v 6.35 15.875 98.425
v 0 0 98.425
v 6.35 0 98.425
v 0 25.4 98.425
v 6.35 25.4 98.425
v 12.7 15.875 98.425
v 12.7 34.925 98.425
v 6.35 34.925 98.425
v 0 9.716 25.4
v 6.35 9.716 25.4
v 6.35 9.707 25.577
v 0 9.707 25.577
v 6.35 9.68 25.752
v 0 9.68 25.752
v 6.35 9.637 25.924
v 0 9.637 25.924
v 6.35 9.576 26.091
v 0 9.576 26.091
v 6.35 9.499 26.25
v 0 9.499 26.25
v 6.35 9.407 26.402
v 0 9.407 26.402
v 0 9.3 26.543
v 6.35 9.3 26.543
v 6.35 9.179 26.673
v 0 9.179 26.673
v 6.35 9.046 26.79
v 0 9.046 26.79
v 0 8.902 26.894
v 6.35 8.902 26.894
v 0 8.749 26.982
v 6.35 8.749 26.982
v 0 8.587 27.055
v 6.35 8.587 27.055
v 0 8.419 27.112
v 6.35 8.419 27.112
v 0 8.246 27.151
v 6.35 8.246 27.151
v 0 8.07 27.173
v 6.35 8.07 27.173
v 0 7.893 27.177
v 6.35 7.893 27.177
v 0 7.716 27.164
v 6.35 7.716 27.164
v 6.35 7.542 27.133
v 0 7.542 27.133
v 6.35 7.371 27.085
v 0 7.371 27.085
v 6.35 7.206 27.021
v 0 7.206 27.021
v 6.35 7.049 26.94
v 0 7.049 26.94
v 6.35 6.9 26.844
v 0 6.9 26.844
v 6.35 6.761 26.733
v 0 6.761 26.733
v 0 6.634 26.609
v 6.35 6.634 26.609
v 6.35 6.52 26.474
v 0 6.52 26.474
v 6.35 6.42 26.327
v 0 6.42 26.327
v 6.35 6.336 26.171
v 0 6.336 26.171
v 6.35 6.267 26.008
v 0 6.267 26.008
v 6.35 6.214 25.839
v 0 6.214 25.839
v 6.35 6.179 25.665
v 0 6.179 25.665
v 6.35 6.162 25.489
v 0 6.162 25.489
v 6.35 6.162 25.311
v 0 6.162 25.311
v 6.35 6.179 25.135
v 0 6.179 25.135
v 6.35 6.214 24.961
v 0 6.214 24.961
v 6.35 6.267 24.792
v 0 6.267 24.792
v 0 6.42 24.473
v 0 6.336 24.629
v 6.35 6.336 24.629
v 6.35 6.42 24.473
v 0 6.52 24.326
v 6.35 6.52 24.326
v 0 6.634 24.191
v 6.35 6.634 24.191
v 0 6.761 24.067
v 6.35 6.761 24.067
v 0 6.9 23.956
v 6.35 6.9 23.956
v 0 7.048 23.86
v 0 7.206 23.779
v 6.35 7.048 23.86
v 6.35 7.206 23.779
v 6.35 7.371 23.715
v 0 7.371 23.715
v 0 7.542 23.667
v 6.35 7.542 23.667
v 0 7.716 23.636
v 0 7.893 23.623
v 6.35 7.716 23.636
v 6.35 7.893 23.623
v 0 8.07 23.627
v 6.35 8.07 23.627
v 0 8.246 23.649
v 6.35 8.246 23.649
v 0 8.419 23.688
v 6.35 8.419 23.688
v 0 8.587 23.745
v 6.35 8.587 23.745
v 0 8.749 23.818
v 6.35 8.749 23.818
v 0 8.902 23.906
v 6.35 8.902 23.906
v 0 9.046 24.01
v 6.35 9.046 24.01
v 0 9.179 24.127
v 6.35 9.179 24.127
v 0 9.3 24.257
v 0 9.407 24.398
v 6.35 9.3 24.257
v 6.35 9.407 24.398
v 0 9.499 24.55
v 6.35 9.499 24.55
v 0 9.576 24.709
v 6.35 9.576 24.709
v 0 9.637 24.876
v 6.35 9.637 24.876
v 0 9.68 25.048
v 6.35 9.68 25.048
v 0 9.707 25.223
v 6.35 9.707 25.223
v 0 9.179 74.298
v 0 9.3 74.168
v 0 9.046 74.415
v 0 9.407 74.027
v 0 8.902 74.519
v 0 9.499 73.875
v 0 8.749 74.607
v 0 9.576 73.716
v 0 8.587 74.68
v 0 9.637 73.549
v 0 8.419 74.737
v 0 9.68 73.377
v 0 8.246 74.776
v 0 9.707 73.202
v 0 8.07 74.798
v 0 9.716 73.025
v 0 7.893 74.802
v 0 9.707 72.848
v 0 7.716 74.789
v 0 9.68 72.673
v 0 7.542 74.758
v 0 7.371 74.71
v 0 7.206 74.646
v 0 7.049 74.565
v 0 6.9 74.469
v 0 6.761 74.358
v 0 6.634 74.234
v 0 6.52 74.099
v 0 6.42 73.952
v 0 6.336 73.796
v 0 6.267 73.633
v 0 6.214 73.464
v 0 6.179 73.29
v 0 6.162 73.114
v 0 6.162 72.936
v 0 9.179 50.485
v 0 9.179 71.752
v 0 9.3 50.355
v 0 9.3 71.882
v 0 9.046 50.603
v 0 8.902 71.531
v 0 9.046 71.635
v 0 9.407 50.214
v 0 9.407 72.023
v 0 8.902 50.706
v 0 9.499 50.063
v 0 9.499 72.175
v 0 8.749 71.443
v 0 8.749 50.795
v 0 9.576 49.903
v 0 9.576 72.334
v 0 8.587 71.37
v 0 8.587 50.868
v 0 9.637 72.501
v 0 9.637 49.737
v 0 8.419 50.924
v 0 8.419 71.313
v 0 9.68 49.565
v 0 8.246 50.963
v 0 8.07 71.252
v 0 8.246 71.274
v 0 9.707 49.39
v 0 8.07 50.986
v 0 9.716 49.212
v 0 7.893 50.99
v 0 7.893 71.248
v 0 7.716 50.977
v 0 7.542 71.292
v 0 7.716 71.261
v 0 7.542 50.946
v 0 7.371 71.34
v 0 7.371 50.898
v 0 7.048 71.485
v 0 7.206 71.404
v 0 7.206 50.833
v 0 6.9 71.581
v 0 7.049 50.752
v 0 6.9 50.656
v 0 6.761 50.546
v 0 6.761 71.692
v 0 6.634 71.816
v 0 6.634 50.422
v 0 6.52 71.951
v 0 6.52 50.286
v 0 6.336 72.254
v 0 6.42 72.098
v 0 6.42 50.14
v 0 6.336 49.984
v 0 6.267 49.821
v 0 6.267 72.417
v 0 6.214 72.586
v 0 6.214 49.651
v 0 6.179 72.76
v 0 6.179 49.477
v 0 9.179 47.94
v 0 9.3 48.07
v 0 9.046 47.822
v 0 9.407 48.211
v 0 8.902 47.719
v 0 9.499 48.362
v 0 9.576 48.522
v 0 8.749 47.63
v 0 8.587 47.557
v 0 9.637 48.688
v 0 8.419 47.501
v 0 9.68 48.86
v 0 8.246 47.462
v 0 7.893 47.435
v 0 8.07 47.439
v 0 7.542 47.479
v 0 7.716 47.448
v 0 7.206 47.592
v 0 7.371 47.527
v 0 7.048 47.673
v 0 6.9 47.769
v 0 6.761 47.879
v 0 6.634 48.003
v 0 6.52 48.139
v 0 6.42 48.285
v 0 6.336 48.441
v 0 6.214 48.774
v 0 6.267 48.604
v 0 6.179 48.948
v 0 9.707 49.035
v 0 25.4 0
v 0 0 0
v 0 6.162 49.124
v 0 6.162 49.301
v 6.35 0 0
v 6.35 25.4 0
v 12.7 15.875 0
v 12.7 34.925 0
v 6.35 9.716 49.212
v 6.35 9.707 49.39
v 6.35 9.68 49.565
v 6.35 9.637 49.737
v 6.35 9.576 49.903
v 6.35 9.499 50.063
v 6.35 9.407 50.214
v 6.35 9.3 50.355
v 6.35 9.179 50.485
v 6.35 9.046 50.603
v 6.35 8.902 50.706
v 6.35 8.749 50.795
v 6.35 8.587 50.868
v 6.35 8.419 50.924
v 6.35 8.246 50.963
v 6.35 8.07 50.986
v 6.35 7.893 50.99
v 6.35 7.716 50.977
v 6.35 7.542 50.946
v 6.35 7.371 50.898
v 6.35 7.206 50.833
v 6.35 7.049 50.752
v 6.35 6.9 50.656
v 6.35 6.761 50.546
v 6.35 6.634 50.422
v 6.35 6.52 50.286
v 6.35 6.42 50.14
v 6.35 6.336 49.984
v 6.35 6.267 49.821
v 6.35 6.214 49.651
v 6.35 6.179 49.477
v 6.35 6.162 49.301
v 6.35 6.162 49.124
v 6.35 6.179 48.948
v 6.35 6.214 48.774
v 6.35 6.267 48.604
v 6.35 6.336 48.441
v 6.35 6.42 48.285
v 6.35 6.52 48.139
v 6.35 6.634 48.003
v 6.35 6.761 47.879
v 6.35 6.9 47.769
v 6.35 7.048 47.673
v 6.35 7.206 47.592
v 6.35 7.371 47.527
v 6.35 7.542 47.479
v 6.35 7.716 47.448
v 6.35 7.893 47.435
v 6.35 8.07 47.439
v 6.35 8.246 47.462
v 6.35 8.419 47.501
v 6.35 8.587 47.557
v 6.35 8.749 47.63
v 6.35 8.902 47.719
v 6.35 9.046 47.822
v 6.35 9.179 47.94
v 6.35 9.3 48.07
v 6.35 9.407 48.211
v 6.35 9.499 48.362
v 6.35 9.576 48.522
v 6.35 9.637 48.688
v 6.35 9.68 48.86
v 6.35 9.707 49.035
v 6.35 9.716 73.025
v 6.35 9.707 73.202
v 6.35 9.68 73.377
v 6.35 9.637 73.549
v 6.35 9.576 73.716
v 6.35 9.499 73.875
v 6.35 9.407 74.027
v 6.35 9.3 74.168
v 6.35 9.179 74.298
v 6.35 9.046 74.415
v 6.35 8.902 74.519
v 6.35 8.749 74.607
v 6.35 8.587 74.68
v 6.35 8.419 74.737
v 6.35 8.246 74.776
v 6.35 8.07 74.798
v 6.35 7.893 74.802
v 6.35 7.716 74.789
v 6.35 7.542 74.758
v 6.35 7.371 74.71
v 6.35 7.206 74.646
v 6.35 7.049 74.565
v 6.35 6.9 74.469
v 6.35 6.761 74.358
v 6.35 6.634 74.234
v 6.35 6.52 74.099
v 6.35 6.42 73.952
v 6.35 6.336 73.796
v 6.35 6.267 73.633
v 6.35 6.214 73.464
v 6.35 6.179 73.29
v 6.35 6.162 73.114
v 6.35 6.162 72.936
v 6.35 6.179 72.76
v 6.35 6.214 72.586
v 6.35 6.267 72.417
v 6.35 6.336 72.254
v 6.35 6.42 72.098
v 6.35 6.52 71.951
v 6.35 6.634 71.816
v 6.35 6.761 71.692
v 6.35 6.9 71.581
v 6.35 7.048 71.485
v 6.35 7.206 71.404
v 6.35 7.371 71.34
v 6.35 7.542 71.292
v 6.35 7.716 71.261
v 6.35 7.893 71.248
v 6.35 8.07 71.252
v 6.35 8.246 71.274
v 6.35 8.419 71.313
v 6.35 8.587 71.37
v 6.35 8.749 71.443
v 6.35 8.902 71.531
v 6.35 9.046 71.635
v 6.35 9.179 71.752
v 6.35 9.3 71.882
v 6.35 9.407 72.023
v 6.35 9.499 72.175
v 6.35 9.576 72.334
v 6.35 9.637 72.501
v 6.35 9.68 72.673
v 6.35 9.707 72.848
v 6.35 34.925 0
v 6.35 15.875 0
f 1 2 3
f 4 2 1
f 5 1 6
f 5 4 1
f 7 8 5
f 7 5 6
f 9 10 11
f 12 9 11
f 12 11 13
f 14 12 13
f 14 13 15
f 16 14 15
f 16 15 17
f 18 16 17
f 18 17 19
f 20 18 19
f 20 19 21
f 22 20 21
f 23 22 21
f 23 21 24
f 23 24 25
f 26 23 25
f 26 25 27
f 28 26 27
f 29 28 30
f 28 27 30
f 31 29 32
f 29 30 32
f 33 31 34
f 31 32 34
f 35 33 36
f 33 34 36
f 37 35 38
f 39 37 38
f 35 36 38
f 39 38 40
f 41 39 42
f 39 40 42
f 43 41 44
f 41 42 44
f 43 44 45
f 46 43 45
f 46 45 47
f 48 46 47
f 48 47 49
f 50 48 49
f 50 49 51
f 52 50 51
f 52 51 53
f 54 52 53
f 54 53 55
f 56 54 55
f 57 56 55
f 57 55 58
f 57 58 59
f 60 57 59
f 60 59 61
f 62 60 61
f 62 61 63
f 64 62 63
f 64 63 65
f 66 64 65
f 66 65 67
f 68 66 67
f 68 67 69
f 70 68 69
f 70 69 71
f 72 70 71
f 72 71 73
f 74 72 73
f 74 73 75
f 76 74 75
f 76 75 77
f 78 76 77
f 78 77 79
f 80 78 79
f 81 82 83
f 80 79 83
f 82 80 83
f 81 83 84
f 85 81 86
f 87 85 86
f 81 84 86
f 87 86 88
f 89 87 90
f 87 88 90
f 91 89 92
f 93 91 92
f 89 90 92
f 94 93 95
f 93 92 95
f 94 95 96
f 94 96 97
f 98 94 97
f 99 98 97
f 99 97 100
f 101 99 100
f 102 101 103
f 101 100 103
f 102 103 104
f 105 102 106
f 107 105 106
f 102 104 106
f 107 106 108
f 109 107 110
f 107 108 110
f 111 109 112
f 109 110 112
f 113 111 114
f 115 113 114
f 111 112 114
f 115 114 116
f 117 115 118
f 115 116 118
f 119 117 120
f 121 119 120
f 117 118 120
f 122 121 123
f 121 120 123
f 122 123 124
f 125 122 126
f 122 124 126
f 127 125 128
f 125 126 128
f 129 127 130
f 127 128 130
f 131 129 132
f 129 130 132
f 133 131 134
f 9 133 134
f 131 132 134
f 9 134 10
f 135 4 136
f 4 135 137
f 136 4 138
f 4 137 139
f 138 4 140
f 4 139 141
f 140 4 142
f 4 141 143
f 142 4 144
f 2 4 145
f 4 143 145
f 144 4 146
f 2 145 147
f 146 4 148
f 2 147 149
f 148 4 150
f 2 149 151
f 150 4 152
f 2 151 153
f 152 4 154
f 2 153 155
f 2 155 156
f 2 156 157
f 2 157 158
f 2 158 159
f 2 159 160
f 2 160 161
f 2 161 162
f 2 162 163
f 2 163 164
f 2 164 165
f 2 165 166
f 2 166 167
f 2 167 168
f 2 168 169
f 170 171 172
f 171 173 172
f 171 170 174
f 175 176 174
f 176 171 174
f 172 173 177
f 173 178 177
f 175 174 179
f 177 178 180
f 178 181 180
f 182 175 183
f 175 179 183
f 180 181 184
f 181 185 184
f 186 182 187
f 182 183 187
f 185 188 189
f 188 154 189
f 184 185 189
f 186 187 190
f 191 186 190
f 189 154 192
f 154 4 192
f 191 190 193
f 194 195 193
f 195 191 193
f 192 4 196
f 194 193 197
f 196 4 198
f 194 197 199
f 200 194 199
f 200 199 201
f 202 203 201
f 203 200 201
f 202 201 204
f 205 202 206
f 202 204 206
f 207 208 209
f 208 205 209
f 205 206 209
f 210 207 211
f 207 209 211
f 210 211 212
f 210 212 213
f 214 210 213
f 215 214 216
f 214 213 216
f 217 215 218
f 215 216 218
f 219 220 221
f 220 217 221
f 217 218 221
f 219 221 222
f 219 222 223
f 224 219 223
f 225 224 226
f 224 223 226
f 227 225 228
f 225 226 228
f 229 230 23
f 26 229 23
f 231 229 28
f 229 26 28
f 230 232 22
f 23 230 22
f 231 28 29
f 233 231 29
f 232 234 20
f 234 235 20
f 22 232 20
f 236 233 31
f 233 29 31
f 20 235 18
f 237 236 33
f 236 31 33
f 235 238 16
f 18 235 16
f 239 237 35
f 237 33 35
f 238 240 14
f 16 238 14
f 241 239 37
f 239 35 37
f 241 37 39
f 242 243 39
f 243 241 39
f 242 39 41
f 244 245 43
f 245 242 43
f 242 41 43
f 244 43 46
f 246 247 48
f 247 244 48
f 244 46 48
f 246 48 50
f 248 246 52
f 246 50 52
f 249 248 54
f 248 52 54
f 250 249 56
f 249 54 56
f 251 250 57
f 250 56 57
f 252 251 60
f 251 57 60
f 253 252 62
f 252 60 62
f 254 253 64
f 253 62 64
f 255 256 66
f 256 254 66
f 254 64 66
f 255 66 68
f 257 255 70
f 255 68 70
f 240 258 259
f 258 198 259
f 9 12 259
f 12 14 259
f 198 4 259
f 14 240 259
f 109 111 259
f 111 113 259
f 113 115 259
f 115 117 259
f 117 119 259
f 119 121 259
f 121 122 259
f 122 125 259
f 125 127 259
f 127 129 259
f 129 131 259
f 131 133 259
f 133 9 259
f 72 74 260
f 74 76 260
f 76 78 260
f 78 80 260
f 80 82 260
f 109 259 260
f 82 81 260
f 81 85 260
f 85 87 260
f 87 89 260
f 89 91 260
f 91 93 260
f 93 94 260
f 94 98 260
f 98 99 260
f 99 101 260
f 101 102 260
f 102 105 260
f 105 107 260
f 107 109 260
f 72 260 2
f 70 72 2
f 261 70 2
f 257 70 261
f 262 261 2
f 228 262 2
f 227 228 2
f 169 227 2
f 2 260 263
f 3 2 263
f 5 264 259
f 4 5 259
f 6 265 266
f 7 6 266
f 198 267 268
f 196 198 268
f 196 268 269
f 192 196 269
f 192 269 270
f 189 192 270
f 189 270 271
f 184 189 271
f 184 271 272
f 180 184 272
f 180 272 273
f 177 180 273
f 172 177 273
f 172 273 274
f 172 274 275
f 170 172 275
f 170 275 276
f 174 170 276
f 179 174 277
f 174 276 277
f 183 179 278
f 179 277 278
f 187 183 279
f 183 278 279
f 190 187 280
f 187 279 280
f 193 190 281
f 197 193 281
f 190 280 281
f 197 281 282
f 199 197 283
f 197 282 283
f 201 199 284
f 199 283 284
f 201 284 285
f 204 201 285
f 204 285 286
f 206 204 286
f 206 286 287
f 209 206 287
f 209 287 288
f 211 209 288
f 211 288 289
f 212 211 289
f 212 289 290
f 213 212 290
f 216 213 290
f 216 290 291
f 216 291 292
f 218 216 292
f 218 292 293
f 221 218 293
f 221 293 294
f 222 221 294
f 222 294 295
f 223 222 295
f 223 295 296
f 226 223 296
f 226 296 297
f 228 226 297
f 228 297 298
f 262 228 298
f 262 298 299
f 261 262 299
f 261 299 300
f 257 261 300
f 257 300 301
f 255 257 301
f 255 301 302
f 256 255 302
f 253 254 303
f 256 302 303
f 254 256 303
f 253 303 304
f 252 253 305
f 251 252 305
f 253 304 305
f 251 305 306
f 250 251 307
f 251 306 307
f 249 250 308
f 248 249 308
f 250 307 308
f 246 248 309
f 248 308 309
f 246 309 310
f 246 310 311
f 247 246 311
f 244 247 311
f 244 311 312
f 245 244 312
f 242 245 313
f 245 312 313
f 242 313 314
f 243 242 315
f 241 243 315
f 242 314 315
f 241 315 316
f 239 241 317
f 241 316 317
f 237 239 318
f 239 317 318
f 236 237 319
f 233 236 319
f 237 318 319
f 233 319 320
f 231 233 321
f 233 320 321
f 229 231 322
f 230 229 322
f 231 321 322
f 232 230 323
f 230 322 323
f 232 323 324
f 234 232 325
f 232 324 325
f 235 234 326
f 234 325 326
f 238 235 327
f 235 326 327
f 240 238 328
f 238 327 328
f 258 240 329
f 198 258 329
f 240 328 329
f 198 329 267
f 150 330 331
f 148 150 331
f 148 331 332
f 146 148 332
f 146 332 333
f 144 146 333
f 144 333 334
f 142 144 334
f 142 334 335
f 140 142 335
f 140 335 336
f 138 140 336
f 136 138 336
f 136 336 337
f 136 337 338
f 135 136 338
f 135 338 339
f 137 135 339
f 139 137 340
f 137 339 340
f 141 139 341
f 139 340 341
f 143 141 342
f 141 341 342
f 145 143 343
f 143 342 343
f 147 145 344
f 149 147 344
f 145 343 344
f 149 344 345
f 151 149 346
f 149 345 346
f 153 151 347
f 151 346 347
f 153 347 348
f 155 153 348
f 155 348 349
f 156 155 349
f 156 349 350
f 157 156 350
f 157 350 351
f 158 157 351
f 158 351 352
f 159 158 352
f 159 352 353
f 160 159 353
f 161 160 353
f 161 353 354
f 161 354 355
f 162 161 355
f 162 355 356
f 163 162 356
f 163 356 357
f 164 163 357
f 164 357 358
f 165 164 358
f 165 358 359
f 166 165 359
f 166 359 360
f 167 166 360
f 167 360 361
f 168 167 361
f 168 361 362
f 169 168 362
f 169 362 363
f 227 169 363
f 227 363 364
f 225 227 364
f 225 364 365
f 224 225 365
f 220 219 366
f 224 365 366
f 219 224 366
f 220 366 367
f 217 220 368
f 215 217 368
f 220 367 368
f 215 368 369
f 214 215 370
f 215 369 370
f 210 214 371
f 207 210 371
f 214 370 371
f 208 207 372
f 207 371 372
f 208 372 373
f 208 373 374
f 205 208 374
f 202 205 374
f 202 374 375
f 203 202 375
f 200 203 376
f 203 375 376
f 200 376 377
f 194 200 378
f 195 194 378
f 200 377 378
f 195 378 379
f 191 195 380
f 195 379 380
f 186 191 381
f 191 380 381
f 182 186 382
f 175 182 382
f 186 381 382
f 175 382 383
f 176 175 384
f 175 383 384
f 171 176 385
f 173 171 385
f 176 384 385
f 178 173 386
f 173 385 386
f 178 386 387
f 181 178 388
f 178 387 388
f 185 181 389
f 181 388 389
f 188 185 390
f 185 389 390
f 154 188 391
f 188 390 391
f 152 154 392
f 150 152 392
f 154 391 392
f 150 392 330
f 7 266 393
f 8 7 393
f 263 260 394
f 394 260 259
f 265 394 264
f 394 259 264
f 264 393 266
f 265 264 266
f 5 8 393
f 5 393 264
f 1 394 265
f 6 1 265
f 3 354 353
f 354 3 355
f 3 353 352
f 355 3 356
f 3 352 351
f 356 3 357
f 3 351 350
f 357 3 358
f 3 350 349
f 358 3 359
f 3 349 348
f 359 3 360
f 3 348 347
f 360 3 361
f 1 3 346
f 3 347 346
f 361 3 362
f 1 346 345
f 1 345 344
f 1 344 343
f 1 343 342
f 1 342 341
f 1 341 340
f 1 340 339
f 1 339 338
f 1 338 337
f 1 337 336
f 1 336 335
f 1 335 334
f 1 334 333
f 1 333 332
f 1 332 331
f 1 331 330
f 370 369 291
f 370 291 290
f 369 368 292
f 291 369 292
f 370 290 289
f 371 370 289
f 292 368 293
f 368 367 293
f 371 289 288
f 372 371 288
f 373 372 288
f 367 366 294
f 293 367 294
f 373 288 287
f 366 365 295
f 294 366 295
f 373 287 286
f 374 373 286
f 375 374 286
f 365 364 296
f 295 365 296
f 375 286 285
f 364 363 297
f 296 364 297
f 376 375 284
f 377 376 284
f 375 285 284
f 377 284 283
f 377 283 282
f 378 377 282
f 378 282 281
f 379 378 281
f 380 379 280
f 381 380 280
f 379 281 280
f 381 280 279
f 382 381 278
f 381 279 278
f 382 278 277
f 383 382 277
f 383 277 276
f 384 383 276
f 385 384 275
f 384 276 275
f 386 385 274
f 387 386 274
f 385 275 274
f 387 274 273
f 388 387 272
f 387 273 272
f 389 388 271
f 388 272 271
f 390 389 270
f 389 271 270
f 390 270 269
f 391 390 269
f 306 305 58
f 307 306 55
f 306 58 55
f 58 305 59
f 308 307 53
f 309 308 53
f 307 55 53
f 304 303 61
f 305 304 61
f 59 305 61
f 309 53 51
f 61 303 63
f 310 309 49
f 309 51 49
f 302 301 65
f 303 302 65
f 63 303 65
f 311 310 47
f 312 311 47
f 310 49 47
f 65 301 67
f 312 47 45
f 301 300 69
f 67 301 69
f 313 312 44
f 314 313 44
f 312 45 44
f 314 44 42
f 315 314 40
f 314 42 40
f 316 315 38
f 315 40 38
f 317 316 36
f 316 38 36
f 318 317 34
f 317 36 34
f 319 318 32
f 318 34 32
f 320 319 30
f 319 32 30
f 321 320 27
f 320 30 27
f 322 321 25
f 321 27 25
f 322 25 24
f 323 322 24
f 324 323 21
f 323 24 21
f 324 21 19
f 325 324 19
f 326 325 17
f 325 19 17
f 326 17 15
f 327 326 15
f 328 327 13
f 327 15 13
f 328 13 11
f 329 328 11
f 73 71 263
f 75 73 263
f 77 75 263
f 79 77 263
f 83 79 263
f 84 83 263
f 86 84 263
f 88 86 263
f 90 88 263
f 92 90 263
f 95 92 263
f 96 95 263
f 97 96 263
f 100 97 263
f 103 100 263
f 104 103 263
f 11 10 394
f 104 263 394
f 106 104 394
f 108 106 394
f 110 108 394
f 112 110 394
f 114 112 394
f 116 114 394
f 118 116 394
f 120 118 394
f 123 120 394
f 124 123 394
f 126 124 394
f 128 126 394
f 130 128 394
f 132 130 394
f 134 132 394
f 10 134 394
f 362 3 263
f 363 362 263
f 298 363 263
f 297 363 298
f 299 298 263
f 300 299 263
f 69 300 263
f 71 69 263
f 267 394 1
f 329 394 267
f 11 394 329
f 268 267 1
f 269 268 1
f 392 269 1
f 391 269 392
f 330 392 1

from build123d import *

# Parameters (mm, degrees)
F1_DEPTH = 98.425
F2_R     = 1.778
F3_DEPTH = 25.4


with BuildPart() as f1:
    # F0 (on Top) → F1 (new body)
    with BuildSketch(Plane.XY):
        Polygon((6.35, 25.4), (6.35, 15.875), (12.7, 15.875), (12.7, 34.925), (6.35, 34.925), align=None)
        Polygon((0, 25.4), (0, 0), (6.35, 0), (6.35, 15.875), (6.35, 25.4), align=None)
    extrude(amount=F1_DEPTH)

    # F2 (on face) → F3 (cut)
    with BuildSketch(Plane.YZ.offset(6.35)):
        with Locations((7.9375, 73.025)):
            Circle(F2_R)
        with Locations((7.9375, 49.2125)):
            Circle(F2_R)
        with Locations((7.9375, 25.4)):
            Circle(F2_R)
    extrude(amount=-F3_DEPTH, mode=Mode.SUBTRACT)


solid = f1.part
